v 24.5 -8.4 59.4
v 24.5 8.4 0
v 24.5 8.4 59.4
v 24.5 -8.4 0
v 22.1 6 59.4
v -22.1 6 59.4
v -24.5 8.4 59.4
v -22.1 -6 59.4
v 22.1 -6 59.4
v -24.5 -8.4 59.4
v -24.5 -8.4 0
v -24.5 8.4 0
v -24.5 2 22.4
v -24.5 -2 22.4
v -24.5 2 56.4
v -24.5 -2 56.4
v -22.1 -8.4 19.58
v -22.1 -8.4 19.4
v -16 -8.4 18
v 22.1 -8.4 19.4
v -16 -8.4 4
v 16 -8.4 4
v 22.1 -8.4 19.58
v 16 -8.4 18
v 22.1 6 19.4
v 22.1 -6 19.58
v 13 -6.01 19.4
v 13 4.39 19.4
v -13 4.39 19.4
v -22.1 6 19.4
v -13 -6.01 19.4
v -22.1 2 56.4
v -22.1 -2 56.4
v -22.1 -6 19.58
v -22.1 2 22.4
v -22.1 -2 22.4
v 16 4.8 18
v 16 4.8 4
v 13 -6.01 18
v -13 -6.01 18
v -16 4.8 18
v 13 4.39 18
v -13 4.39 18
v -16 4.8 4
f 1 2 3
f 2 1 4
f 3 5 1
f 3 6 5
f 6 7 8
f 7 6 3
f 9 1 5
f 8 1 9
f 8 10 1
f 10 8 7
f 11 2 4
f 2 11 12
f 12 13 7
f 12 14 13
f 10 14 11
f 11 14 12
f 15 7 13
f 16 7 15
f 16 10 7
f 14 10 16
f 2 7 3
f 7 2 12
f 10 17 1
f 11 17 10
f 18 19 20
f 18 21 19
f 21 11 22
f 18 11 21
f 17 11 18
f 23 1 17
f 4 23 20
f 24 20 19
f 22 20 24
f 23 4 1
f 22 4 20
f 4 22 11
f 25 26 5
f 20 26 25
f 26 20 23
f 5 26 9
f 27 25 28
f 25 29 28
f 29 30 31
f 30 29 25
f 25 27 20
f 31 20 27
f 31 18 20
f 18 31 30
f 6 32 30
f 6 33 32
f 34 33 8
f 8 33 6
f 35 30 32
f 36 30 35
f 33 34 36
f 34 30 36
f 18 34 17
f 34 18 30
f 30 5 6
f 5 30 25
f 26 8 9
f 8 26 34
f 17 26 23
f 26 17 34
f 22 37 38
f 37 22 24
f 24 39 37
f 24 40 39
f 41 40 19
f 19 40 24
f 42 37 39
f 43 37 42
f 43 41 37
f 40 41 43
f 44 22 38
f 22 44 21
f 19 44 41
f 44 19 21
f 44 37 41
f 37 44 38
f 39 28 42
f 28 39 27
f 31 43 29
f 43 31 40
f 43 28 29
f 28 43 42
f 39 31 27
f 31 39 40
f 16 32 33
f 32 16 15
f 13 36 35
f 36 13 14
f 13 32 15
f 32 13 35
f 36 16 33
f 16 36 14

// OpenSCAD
// =====================================================================
//  Distributeur de demi-lames à gravité – usage barbier
//  Chargement par le haut (couvercle), sortie une à une en bas :
//  on pose le doigt sous la lame du bas (fenêtre) et on la tire vers soi.
//  Fichier paramétrique OpenSCAD – cotes en mm
// =====================================================================

/* [Demi-lame] */
blade_l = 43.0;   // longueur d'une demi-lame (lame DE 43 x 22,2 coupée en deux)
blade_w = 11.1;   // largeur d'une demi-lame
clr_l   = 0.6;    // jeu aux extrémités (par côté)
clr_w   = 0.45;   // jeu avant/arrière (par côté)

/* [Sortie] */
gap     = 0.18;   // hauteur de la fente de sortie : > 1 lame (0,1) et < 2 lames

/* [Corps] */
capacity_h = 40;  // hauteur de la réserve (≈ 400 demi-lames)
wall    = 2.4;
floor_t = 1.4;    // fond sous la pile (le doigt passe par la fenêtre)
floor_z = 18;      // hauteur du fond : place pour le doigt dessous (14 mm)
base_d  = 0;       // profondeur du socle (0 = aussi étroit que la tour, à coller au double face)
base_t  = 4;
win_l   = 26;     // fenêtre doigt sous la lame (longueur)
fc_w    = 32;     // largeur de la niche pour le doigt
view_w  = 4;      // fente latérale pour voir le stock

/* [Couvercle] */
lid_clr  = 0.25;
lid_skirt= 8;
lid_top  = 2;

part = "assembly"; // [assembly, body, lid, print, body_print, section]

eps = 0.01;
ch_l  = blade_l + 2*clr_l;
ch_w  = blade_w + 2*clr_w;
out_l = ch_l + 2*wall;
out_w = ch_w + 2*wall;
fl_top = floor_z + floor_t;           // dessus du fond = niveau de la lame du bas
top_z  = fl_top + capacity_h;

module body() {
    difference() {
        union() {
            translate([-out_l/2, -out_w/2, 0]) cube([out_l, out_w, top_z]);
            if (base_d > out_w) {
            translate([-out_l/2, -base_d/2, 0]) cube([out_l, base_d, base_t]);
            // goussets avant / arrière (profil constant selon X)
            for (s = [-1, 1])
                rotate([90, 0, 90]) translate([0, 0, -out_l/2])
                    linear_extrude(out_l)
                        polygon([[s*out_w/2, base_t - eps], [s*base_d/2, base_t - eps],
                                 [s*out_w/2, base_t + (base_d - out_w)/2 * 0.9]]);
            }
        }
        // réserve de lames
        translate([-ch_l/2, -ch_w/2, fl_top]) cube([ch_l, ch_w, capacity_h + 1]);
        // fente de sortie à l'avant (une seule lame)
        translate([-ch_l/2, -out_w/2 - 1, fl_top]) cube([ch_l, wall + 2, gap]);
        // dégagement devant la fente pour attraper la lame (avant du fond abaissé)
        translate([-ch_l/2, -max(base_d, out_w)/2 - 1, fl_top]) cube([ch_l, max(base_d, out_w)/2 - out_w/2 + 1 - eps, 50]);
        // niche pour le doigt sous le fond, ouverte vers l'avant
        translate([-fc_w/2, -max(base_d, out_w)/2 - 1, base_t])
            cube([fc_w, max(base_d, out_w)/2 + ch_w/2 - 1.2 + 1, floor_z - base_t]);
        // fenêtre dans le fond : le doigt touche la lame du bas
        translate([-win_l/2, -ch_w/2 - eps, floor_z - 1]) cube([win_l, ch_w - 1.6, floor_t + 1 + eps]);
        // fente latérale de visualisation du stock (côté gauche)
        translate([-out_l/2 - 1, -view_w/2, fl_top + 3]) cube([wall + 2, view_w, capacity_h - 6]);
    }
}

module lid() {
    il = out_l + 2*lid_clr;
    iw = out_w + 2*lid_clr;
    difference() {
        translate([-il/2 - 2, -iw/2 - 2, 0]) cube([il + 4, iw + 4, lid_top + lid_skirt]);
        translate([-il/2, -iw/2, lid_top]) cube([il, iw, lid_skirt + 1]);
    }
    // ergot de maintien (petite bosse à friction) sur les grands côtés
    for (s = [-1, 1])
        translate([-6, s*(iw/2) - (s > 0 ? 0.35 : 0), lid_top + lid_skirt - 3]) cube([12, 0.35, 2]);
}

if (part == "body") body();
else if (part == "lid") lid();
else if (part == "body_print") {
    translate([0, 0, out_l/2]) rotate([0, 90, 0]) body();
}
else if (part == "print") {
    // corps couché sur le côté : la fente de sortie est dans le plan XY (précision max)
    translate([0, 0, out_l/2]) rotate([0, 90, 0]) body();
    translate([0, max(base_d, out_w)/2 + 20, 0]) lid();
}
else if (part == "section") {
    intersection() { body(); translate([-1, -50, 0]) cube([2, 100, 100]); }
}
else {
    body();
    %translate([0, 0, top_z + lid_top + lid_skirt + 5]) rotate([180, 0, 0]) translate([0,0,0]) lid();
}
